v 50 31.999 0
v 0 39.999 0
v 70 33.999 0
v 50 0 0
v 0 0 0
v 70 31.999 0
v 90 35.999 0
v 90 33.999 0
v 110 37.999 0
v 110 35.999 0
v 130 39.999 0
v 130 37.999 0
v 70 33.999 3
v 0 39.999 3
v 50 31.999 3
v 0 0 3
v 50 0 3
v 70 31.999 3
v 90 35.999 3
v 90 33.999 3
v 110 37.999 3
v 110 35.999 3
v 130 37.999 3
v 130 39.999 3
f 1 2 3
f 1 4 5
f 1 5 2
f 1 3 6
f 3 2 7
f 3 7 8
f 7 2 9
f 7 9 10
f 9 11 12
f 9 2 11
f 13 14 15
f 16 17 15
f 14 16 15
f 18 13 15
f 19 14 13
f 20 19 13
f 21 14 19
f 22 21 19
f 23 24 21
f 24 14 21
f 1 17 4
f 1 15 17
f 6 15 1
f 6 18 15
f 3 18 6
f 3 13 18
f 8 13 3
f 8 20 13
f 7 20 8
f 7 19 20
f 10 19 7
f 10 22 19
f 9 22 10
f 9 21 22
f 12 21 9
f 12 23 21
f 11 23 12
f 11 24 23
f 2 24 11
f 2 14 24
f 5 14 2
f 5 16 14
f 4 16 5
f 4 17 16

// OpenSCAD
height_00 = 00;
height_02 = 02;
height_04 = 04;
height_06 = 06;
height_08 = 08;

heights = [
    height_00,
    height_02,
    height_04,
    height_06,
    height_08,
];

lengths = [
    0,
    20,
    40,
    60,
    80
];

 H = 32;
 W = 50;
 
 eps = .001;
 
 linear_extrude(3) {
    translate([0, H + height_06 - eps, 0]) {
        square([W + lengths[4], 2], center = false);
    };
    translate([0, H + height_04 - eps, 0]) {
        square([W + lengths[3], 2], center = false);
    };
    translate([0, H + height_02 - eps, 0]) {
        square([W + lengths[2], 2], center = false);
    };
    translate([0, H - eps, 0]) {
        square([W + lengths[1], 2], center = false);
    };
    square([W, H], center = false);
};
